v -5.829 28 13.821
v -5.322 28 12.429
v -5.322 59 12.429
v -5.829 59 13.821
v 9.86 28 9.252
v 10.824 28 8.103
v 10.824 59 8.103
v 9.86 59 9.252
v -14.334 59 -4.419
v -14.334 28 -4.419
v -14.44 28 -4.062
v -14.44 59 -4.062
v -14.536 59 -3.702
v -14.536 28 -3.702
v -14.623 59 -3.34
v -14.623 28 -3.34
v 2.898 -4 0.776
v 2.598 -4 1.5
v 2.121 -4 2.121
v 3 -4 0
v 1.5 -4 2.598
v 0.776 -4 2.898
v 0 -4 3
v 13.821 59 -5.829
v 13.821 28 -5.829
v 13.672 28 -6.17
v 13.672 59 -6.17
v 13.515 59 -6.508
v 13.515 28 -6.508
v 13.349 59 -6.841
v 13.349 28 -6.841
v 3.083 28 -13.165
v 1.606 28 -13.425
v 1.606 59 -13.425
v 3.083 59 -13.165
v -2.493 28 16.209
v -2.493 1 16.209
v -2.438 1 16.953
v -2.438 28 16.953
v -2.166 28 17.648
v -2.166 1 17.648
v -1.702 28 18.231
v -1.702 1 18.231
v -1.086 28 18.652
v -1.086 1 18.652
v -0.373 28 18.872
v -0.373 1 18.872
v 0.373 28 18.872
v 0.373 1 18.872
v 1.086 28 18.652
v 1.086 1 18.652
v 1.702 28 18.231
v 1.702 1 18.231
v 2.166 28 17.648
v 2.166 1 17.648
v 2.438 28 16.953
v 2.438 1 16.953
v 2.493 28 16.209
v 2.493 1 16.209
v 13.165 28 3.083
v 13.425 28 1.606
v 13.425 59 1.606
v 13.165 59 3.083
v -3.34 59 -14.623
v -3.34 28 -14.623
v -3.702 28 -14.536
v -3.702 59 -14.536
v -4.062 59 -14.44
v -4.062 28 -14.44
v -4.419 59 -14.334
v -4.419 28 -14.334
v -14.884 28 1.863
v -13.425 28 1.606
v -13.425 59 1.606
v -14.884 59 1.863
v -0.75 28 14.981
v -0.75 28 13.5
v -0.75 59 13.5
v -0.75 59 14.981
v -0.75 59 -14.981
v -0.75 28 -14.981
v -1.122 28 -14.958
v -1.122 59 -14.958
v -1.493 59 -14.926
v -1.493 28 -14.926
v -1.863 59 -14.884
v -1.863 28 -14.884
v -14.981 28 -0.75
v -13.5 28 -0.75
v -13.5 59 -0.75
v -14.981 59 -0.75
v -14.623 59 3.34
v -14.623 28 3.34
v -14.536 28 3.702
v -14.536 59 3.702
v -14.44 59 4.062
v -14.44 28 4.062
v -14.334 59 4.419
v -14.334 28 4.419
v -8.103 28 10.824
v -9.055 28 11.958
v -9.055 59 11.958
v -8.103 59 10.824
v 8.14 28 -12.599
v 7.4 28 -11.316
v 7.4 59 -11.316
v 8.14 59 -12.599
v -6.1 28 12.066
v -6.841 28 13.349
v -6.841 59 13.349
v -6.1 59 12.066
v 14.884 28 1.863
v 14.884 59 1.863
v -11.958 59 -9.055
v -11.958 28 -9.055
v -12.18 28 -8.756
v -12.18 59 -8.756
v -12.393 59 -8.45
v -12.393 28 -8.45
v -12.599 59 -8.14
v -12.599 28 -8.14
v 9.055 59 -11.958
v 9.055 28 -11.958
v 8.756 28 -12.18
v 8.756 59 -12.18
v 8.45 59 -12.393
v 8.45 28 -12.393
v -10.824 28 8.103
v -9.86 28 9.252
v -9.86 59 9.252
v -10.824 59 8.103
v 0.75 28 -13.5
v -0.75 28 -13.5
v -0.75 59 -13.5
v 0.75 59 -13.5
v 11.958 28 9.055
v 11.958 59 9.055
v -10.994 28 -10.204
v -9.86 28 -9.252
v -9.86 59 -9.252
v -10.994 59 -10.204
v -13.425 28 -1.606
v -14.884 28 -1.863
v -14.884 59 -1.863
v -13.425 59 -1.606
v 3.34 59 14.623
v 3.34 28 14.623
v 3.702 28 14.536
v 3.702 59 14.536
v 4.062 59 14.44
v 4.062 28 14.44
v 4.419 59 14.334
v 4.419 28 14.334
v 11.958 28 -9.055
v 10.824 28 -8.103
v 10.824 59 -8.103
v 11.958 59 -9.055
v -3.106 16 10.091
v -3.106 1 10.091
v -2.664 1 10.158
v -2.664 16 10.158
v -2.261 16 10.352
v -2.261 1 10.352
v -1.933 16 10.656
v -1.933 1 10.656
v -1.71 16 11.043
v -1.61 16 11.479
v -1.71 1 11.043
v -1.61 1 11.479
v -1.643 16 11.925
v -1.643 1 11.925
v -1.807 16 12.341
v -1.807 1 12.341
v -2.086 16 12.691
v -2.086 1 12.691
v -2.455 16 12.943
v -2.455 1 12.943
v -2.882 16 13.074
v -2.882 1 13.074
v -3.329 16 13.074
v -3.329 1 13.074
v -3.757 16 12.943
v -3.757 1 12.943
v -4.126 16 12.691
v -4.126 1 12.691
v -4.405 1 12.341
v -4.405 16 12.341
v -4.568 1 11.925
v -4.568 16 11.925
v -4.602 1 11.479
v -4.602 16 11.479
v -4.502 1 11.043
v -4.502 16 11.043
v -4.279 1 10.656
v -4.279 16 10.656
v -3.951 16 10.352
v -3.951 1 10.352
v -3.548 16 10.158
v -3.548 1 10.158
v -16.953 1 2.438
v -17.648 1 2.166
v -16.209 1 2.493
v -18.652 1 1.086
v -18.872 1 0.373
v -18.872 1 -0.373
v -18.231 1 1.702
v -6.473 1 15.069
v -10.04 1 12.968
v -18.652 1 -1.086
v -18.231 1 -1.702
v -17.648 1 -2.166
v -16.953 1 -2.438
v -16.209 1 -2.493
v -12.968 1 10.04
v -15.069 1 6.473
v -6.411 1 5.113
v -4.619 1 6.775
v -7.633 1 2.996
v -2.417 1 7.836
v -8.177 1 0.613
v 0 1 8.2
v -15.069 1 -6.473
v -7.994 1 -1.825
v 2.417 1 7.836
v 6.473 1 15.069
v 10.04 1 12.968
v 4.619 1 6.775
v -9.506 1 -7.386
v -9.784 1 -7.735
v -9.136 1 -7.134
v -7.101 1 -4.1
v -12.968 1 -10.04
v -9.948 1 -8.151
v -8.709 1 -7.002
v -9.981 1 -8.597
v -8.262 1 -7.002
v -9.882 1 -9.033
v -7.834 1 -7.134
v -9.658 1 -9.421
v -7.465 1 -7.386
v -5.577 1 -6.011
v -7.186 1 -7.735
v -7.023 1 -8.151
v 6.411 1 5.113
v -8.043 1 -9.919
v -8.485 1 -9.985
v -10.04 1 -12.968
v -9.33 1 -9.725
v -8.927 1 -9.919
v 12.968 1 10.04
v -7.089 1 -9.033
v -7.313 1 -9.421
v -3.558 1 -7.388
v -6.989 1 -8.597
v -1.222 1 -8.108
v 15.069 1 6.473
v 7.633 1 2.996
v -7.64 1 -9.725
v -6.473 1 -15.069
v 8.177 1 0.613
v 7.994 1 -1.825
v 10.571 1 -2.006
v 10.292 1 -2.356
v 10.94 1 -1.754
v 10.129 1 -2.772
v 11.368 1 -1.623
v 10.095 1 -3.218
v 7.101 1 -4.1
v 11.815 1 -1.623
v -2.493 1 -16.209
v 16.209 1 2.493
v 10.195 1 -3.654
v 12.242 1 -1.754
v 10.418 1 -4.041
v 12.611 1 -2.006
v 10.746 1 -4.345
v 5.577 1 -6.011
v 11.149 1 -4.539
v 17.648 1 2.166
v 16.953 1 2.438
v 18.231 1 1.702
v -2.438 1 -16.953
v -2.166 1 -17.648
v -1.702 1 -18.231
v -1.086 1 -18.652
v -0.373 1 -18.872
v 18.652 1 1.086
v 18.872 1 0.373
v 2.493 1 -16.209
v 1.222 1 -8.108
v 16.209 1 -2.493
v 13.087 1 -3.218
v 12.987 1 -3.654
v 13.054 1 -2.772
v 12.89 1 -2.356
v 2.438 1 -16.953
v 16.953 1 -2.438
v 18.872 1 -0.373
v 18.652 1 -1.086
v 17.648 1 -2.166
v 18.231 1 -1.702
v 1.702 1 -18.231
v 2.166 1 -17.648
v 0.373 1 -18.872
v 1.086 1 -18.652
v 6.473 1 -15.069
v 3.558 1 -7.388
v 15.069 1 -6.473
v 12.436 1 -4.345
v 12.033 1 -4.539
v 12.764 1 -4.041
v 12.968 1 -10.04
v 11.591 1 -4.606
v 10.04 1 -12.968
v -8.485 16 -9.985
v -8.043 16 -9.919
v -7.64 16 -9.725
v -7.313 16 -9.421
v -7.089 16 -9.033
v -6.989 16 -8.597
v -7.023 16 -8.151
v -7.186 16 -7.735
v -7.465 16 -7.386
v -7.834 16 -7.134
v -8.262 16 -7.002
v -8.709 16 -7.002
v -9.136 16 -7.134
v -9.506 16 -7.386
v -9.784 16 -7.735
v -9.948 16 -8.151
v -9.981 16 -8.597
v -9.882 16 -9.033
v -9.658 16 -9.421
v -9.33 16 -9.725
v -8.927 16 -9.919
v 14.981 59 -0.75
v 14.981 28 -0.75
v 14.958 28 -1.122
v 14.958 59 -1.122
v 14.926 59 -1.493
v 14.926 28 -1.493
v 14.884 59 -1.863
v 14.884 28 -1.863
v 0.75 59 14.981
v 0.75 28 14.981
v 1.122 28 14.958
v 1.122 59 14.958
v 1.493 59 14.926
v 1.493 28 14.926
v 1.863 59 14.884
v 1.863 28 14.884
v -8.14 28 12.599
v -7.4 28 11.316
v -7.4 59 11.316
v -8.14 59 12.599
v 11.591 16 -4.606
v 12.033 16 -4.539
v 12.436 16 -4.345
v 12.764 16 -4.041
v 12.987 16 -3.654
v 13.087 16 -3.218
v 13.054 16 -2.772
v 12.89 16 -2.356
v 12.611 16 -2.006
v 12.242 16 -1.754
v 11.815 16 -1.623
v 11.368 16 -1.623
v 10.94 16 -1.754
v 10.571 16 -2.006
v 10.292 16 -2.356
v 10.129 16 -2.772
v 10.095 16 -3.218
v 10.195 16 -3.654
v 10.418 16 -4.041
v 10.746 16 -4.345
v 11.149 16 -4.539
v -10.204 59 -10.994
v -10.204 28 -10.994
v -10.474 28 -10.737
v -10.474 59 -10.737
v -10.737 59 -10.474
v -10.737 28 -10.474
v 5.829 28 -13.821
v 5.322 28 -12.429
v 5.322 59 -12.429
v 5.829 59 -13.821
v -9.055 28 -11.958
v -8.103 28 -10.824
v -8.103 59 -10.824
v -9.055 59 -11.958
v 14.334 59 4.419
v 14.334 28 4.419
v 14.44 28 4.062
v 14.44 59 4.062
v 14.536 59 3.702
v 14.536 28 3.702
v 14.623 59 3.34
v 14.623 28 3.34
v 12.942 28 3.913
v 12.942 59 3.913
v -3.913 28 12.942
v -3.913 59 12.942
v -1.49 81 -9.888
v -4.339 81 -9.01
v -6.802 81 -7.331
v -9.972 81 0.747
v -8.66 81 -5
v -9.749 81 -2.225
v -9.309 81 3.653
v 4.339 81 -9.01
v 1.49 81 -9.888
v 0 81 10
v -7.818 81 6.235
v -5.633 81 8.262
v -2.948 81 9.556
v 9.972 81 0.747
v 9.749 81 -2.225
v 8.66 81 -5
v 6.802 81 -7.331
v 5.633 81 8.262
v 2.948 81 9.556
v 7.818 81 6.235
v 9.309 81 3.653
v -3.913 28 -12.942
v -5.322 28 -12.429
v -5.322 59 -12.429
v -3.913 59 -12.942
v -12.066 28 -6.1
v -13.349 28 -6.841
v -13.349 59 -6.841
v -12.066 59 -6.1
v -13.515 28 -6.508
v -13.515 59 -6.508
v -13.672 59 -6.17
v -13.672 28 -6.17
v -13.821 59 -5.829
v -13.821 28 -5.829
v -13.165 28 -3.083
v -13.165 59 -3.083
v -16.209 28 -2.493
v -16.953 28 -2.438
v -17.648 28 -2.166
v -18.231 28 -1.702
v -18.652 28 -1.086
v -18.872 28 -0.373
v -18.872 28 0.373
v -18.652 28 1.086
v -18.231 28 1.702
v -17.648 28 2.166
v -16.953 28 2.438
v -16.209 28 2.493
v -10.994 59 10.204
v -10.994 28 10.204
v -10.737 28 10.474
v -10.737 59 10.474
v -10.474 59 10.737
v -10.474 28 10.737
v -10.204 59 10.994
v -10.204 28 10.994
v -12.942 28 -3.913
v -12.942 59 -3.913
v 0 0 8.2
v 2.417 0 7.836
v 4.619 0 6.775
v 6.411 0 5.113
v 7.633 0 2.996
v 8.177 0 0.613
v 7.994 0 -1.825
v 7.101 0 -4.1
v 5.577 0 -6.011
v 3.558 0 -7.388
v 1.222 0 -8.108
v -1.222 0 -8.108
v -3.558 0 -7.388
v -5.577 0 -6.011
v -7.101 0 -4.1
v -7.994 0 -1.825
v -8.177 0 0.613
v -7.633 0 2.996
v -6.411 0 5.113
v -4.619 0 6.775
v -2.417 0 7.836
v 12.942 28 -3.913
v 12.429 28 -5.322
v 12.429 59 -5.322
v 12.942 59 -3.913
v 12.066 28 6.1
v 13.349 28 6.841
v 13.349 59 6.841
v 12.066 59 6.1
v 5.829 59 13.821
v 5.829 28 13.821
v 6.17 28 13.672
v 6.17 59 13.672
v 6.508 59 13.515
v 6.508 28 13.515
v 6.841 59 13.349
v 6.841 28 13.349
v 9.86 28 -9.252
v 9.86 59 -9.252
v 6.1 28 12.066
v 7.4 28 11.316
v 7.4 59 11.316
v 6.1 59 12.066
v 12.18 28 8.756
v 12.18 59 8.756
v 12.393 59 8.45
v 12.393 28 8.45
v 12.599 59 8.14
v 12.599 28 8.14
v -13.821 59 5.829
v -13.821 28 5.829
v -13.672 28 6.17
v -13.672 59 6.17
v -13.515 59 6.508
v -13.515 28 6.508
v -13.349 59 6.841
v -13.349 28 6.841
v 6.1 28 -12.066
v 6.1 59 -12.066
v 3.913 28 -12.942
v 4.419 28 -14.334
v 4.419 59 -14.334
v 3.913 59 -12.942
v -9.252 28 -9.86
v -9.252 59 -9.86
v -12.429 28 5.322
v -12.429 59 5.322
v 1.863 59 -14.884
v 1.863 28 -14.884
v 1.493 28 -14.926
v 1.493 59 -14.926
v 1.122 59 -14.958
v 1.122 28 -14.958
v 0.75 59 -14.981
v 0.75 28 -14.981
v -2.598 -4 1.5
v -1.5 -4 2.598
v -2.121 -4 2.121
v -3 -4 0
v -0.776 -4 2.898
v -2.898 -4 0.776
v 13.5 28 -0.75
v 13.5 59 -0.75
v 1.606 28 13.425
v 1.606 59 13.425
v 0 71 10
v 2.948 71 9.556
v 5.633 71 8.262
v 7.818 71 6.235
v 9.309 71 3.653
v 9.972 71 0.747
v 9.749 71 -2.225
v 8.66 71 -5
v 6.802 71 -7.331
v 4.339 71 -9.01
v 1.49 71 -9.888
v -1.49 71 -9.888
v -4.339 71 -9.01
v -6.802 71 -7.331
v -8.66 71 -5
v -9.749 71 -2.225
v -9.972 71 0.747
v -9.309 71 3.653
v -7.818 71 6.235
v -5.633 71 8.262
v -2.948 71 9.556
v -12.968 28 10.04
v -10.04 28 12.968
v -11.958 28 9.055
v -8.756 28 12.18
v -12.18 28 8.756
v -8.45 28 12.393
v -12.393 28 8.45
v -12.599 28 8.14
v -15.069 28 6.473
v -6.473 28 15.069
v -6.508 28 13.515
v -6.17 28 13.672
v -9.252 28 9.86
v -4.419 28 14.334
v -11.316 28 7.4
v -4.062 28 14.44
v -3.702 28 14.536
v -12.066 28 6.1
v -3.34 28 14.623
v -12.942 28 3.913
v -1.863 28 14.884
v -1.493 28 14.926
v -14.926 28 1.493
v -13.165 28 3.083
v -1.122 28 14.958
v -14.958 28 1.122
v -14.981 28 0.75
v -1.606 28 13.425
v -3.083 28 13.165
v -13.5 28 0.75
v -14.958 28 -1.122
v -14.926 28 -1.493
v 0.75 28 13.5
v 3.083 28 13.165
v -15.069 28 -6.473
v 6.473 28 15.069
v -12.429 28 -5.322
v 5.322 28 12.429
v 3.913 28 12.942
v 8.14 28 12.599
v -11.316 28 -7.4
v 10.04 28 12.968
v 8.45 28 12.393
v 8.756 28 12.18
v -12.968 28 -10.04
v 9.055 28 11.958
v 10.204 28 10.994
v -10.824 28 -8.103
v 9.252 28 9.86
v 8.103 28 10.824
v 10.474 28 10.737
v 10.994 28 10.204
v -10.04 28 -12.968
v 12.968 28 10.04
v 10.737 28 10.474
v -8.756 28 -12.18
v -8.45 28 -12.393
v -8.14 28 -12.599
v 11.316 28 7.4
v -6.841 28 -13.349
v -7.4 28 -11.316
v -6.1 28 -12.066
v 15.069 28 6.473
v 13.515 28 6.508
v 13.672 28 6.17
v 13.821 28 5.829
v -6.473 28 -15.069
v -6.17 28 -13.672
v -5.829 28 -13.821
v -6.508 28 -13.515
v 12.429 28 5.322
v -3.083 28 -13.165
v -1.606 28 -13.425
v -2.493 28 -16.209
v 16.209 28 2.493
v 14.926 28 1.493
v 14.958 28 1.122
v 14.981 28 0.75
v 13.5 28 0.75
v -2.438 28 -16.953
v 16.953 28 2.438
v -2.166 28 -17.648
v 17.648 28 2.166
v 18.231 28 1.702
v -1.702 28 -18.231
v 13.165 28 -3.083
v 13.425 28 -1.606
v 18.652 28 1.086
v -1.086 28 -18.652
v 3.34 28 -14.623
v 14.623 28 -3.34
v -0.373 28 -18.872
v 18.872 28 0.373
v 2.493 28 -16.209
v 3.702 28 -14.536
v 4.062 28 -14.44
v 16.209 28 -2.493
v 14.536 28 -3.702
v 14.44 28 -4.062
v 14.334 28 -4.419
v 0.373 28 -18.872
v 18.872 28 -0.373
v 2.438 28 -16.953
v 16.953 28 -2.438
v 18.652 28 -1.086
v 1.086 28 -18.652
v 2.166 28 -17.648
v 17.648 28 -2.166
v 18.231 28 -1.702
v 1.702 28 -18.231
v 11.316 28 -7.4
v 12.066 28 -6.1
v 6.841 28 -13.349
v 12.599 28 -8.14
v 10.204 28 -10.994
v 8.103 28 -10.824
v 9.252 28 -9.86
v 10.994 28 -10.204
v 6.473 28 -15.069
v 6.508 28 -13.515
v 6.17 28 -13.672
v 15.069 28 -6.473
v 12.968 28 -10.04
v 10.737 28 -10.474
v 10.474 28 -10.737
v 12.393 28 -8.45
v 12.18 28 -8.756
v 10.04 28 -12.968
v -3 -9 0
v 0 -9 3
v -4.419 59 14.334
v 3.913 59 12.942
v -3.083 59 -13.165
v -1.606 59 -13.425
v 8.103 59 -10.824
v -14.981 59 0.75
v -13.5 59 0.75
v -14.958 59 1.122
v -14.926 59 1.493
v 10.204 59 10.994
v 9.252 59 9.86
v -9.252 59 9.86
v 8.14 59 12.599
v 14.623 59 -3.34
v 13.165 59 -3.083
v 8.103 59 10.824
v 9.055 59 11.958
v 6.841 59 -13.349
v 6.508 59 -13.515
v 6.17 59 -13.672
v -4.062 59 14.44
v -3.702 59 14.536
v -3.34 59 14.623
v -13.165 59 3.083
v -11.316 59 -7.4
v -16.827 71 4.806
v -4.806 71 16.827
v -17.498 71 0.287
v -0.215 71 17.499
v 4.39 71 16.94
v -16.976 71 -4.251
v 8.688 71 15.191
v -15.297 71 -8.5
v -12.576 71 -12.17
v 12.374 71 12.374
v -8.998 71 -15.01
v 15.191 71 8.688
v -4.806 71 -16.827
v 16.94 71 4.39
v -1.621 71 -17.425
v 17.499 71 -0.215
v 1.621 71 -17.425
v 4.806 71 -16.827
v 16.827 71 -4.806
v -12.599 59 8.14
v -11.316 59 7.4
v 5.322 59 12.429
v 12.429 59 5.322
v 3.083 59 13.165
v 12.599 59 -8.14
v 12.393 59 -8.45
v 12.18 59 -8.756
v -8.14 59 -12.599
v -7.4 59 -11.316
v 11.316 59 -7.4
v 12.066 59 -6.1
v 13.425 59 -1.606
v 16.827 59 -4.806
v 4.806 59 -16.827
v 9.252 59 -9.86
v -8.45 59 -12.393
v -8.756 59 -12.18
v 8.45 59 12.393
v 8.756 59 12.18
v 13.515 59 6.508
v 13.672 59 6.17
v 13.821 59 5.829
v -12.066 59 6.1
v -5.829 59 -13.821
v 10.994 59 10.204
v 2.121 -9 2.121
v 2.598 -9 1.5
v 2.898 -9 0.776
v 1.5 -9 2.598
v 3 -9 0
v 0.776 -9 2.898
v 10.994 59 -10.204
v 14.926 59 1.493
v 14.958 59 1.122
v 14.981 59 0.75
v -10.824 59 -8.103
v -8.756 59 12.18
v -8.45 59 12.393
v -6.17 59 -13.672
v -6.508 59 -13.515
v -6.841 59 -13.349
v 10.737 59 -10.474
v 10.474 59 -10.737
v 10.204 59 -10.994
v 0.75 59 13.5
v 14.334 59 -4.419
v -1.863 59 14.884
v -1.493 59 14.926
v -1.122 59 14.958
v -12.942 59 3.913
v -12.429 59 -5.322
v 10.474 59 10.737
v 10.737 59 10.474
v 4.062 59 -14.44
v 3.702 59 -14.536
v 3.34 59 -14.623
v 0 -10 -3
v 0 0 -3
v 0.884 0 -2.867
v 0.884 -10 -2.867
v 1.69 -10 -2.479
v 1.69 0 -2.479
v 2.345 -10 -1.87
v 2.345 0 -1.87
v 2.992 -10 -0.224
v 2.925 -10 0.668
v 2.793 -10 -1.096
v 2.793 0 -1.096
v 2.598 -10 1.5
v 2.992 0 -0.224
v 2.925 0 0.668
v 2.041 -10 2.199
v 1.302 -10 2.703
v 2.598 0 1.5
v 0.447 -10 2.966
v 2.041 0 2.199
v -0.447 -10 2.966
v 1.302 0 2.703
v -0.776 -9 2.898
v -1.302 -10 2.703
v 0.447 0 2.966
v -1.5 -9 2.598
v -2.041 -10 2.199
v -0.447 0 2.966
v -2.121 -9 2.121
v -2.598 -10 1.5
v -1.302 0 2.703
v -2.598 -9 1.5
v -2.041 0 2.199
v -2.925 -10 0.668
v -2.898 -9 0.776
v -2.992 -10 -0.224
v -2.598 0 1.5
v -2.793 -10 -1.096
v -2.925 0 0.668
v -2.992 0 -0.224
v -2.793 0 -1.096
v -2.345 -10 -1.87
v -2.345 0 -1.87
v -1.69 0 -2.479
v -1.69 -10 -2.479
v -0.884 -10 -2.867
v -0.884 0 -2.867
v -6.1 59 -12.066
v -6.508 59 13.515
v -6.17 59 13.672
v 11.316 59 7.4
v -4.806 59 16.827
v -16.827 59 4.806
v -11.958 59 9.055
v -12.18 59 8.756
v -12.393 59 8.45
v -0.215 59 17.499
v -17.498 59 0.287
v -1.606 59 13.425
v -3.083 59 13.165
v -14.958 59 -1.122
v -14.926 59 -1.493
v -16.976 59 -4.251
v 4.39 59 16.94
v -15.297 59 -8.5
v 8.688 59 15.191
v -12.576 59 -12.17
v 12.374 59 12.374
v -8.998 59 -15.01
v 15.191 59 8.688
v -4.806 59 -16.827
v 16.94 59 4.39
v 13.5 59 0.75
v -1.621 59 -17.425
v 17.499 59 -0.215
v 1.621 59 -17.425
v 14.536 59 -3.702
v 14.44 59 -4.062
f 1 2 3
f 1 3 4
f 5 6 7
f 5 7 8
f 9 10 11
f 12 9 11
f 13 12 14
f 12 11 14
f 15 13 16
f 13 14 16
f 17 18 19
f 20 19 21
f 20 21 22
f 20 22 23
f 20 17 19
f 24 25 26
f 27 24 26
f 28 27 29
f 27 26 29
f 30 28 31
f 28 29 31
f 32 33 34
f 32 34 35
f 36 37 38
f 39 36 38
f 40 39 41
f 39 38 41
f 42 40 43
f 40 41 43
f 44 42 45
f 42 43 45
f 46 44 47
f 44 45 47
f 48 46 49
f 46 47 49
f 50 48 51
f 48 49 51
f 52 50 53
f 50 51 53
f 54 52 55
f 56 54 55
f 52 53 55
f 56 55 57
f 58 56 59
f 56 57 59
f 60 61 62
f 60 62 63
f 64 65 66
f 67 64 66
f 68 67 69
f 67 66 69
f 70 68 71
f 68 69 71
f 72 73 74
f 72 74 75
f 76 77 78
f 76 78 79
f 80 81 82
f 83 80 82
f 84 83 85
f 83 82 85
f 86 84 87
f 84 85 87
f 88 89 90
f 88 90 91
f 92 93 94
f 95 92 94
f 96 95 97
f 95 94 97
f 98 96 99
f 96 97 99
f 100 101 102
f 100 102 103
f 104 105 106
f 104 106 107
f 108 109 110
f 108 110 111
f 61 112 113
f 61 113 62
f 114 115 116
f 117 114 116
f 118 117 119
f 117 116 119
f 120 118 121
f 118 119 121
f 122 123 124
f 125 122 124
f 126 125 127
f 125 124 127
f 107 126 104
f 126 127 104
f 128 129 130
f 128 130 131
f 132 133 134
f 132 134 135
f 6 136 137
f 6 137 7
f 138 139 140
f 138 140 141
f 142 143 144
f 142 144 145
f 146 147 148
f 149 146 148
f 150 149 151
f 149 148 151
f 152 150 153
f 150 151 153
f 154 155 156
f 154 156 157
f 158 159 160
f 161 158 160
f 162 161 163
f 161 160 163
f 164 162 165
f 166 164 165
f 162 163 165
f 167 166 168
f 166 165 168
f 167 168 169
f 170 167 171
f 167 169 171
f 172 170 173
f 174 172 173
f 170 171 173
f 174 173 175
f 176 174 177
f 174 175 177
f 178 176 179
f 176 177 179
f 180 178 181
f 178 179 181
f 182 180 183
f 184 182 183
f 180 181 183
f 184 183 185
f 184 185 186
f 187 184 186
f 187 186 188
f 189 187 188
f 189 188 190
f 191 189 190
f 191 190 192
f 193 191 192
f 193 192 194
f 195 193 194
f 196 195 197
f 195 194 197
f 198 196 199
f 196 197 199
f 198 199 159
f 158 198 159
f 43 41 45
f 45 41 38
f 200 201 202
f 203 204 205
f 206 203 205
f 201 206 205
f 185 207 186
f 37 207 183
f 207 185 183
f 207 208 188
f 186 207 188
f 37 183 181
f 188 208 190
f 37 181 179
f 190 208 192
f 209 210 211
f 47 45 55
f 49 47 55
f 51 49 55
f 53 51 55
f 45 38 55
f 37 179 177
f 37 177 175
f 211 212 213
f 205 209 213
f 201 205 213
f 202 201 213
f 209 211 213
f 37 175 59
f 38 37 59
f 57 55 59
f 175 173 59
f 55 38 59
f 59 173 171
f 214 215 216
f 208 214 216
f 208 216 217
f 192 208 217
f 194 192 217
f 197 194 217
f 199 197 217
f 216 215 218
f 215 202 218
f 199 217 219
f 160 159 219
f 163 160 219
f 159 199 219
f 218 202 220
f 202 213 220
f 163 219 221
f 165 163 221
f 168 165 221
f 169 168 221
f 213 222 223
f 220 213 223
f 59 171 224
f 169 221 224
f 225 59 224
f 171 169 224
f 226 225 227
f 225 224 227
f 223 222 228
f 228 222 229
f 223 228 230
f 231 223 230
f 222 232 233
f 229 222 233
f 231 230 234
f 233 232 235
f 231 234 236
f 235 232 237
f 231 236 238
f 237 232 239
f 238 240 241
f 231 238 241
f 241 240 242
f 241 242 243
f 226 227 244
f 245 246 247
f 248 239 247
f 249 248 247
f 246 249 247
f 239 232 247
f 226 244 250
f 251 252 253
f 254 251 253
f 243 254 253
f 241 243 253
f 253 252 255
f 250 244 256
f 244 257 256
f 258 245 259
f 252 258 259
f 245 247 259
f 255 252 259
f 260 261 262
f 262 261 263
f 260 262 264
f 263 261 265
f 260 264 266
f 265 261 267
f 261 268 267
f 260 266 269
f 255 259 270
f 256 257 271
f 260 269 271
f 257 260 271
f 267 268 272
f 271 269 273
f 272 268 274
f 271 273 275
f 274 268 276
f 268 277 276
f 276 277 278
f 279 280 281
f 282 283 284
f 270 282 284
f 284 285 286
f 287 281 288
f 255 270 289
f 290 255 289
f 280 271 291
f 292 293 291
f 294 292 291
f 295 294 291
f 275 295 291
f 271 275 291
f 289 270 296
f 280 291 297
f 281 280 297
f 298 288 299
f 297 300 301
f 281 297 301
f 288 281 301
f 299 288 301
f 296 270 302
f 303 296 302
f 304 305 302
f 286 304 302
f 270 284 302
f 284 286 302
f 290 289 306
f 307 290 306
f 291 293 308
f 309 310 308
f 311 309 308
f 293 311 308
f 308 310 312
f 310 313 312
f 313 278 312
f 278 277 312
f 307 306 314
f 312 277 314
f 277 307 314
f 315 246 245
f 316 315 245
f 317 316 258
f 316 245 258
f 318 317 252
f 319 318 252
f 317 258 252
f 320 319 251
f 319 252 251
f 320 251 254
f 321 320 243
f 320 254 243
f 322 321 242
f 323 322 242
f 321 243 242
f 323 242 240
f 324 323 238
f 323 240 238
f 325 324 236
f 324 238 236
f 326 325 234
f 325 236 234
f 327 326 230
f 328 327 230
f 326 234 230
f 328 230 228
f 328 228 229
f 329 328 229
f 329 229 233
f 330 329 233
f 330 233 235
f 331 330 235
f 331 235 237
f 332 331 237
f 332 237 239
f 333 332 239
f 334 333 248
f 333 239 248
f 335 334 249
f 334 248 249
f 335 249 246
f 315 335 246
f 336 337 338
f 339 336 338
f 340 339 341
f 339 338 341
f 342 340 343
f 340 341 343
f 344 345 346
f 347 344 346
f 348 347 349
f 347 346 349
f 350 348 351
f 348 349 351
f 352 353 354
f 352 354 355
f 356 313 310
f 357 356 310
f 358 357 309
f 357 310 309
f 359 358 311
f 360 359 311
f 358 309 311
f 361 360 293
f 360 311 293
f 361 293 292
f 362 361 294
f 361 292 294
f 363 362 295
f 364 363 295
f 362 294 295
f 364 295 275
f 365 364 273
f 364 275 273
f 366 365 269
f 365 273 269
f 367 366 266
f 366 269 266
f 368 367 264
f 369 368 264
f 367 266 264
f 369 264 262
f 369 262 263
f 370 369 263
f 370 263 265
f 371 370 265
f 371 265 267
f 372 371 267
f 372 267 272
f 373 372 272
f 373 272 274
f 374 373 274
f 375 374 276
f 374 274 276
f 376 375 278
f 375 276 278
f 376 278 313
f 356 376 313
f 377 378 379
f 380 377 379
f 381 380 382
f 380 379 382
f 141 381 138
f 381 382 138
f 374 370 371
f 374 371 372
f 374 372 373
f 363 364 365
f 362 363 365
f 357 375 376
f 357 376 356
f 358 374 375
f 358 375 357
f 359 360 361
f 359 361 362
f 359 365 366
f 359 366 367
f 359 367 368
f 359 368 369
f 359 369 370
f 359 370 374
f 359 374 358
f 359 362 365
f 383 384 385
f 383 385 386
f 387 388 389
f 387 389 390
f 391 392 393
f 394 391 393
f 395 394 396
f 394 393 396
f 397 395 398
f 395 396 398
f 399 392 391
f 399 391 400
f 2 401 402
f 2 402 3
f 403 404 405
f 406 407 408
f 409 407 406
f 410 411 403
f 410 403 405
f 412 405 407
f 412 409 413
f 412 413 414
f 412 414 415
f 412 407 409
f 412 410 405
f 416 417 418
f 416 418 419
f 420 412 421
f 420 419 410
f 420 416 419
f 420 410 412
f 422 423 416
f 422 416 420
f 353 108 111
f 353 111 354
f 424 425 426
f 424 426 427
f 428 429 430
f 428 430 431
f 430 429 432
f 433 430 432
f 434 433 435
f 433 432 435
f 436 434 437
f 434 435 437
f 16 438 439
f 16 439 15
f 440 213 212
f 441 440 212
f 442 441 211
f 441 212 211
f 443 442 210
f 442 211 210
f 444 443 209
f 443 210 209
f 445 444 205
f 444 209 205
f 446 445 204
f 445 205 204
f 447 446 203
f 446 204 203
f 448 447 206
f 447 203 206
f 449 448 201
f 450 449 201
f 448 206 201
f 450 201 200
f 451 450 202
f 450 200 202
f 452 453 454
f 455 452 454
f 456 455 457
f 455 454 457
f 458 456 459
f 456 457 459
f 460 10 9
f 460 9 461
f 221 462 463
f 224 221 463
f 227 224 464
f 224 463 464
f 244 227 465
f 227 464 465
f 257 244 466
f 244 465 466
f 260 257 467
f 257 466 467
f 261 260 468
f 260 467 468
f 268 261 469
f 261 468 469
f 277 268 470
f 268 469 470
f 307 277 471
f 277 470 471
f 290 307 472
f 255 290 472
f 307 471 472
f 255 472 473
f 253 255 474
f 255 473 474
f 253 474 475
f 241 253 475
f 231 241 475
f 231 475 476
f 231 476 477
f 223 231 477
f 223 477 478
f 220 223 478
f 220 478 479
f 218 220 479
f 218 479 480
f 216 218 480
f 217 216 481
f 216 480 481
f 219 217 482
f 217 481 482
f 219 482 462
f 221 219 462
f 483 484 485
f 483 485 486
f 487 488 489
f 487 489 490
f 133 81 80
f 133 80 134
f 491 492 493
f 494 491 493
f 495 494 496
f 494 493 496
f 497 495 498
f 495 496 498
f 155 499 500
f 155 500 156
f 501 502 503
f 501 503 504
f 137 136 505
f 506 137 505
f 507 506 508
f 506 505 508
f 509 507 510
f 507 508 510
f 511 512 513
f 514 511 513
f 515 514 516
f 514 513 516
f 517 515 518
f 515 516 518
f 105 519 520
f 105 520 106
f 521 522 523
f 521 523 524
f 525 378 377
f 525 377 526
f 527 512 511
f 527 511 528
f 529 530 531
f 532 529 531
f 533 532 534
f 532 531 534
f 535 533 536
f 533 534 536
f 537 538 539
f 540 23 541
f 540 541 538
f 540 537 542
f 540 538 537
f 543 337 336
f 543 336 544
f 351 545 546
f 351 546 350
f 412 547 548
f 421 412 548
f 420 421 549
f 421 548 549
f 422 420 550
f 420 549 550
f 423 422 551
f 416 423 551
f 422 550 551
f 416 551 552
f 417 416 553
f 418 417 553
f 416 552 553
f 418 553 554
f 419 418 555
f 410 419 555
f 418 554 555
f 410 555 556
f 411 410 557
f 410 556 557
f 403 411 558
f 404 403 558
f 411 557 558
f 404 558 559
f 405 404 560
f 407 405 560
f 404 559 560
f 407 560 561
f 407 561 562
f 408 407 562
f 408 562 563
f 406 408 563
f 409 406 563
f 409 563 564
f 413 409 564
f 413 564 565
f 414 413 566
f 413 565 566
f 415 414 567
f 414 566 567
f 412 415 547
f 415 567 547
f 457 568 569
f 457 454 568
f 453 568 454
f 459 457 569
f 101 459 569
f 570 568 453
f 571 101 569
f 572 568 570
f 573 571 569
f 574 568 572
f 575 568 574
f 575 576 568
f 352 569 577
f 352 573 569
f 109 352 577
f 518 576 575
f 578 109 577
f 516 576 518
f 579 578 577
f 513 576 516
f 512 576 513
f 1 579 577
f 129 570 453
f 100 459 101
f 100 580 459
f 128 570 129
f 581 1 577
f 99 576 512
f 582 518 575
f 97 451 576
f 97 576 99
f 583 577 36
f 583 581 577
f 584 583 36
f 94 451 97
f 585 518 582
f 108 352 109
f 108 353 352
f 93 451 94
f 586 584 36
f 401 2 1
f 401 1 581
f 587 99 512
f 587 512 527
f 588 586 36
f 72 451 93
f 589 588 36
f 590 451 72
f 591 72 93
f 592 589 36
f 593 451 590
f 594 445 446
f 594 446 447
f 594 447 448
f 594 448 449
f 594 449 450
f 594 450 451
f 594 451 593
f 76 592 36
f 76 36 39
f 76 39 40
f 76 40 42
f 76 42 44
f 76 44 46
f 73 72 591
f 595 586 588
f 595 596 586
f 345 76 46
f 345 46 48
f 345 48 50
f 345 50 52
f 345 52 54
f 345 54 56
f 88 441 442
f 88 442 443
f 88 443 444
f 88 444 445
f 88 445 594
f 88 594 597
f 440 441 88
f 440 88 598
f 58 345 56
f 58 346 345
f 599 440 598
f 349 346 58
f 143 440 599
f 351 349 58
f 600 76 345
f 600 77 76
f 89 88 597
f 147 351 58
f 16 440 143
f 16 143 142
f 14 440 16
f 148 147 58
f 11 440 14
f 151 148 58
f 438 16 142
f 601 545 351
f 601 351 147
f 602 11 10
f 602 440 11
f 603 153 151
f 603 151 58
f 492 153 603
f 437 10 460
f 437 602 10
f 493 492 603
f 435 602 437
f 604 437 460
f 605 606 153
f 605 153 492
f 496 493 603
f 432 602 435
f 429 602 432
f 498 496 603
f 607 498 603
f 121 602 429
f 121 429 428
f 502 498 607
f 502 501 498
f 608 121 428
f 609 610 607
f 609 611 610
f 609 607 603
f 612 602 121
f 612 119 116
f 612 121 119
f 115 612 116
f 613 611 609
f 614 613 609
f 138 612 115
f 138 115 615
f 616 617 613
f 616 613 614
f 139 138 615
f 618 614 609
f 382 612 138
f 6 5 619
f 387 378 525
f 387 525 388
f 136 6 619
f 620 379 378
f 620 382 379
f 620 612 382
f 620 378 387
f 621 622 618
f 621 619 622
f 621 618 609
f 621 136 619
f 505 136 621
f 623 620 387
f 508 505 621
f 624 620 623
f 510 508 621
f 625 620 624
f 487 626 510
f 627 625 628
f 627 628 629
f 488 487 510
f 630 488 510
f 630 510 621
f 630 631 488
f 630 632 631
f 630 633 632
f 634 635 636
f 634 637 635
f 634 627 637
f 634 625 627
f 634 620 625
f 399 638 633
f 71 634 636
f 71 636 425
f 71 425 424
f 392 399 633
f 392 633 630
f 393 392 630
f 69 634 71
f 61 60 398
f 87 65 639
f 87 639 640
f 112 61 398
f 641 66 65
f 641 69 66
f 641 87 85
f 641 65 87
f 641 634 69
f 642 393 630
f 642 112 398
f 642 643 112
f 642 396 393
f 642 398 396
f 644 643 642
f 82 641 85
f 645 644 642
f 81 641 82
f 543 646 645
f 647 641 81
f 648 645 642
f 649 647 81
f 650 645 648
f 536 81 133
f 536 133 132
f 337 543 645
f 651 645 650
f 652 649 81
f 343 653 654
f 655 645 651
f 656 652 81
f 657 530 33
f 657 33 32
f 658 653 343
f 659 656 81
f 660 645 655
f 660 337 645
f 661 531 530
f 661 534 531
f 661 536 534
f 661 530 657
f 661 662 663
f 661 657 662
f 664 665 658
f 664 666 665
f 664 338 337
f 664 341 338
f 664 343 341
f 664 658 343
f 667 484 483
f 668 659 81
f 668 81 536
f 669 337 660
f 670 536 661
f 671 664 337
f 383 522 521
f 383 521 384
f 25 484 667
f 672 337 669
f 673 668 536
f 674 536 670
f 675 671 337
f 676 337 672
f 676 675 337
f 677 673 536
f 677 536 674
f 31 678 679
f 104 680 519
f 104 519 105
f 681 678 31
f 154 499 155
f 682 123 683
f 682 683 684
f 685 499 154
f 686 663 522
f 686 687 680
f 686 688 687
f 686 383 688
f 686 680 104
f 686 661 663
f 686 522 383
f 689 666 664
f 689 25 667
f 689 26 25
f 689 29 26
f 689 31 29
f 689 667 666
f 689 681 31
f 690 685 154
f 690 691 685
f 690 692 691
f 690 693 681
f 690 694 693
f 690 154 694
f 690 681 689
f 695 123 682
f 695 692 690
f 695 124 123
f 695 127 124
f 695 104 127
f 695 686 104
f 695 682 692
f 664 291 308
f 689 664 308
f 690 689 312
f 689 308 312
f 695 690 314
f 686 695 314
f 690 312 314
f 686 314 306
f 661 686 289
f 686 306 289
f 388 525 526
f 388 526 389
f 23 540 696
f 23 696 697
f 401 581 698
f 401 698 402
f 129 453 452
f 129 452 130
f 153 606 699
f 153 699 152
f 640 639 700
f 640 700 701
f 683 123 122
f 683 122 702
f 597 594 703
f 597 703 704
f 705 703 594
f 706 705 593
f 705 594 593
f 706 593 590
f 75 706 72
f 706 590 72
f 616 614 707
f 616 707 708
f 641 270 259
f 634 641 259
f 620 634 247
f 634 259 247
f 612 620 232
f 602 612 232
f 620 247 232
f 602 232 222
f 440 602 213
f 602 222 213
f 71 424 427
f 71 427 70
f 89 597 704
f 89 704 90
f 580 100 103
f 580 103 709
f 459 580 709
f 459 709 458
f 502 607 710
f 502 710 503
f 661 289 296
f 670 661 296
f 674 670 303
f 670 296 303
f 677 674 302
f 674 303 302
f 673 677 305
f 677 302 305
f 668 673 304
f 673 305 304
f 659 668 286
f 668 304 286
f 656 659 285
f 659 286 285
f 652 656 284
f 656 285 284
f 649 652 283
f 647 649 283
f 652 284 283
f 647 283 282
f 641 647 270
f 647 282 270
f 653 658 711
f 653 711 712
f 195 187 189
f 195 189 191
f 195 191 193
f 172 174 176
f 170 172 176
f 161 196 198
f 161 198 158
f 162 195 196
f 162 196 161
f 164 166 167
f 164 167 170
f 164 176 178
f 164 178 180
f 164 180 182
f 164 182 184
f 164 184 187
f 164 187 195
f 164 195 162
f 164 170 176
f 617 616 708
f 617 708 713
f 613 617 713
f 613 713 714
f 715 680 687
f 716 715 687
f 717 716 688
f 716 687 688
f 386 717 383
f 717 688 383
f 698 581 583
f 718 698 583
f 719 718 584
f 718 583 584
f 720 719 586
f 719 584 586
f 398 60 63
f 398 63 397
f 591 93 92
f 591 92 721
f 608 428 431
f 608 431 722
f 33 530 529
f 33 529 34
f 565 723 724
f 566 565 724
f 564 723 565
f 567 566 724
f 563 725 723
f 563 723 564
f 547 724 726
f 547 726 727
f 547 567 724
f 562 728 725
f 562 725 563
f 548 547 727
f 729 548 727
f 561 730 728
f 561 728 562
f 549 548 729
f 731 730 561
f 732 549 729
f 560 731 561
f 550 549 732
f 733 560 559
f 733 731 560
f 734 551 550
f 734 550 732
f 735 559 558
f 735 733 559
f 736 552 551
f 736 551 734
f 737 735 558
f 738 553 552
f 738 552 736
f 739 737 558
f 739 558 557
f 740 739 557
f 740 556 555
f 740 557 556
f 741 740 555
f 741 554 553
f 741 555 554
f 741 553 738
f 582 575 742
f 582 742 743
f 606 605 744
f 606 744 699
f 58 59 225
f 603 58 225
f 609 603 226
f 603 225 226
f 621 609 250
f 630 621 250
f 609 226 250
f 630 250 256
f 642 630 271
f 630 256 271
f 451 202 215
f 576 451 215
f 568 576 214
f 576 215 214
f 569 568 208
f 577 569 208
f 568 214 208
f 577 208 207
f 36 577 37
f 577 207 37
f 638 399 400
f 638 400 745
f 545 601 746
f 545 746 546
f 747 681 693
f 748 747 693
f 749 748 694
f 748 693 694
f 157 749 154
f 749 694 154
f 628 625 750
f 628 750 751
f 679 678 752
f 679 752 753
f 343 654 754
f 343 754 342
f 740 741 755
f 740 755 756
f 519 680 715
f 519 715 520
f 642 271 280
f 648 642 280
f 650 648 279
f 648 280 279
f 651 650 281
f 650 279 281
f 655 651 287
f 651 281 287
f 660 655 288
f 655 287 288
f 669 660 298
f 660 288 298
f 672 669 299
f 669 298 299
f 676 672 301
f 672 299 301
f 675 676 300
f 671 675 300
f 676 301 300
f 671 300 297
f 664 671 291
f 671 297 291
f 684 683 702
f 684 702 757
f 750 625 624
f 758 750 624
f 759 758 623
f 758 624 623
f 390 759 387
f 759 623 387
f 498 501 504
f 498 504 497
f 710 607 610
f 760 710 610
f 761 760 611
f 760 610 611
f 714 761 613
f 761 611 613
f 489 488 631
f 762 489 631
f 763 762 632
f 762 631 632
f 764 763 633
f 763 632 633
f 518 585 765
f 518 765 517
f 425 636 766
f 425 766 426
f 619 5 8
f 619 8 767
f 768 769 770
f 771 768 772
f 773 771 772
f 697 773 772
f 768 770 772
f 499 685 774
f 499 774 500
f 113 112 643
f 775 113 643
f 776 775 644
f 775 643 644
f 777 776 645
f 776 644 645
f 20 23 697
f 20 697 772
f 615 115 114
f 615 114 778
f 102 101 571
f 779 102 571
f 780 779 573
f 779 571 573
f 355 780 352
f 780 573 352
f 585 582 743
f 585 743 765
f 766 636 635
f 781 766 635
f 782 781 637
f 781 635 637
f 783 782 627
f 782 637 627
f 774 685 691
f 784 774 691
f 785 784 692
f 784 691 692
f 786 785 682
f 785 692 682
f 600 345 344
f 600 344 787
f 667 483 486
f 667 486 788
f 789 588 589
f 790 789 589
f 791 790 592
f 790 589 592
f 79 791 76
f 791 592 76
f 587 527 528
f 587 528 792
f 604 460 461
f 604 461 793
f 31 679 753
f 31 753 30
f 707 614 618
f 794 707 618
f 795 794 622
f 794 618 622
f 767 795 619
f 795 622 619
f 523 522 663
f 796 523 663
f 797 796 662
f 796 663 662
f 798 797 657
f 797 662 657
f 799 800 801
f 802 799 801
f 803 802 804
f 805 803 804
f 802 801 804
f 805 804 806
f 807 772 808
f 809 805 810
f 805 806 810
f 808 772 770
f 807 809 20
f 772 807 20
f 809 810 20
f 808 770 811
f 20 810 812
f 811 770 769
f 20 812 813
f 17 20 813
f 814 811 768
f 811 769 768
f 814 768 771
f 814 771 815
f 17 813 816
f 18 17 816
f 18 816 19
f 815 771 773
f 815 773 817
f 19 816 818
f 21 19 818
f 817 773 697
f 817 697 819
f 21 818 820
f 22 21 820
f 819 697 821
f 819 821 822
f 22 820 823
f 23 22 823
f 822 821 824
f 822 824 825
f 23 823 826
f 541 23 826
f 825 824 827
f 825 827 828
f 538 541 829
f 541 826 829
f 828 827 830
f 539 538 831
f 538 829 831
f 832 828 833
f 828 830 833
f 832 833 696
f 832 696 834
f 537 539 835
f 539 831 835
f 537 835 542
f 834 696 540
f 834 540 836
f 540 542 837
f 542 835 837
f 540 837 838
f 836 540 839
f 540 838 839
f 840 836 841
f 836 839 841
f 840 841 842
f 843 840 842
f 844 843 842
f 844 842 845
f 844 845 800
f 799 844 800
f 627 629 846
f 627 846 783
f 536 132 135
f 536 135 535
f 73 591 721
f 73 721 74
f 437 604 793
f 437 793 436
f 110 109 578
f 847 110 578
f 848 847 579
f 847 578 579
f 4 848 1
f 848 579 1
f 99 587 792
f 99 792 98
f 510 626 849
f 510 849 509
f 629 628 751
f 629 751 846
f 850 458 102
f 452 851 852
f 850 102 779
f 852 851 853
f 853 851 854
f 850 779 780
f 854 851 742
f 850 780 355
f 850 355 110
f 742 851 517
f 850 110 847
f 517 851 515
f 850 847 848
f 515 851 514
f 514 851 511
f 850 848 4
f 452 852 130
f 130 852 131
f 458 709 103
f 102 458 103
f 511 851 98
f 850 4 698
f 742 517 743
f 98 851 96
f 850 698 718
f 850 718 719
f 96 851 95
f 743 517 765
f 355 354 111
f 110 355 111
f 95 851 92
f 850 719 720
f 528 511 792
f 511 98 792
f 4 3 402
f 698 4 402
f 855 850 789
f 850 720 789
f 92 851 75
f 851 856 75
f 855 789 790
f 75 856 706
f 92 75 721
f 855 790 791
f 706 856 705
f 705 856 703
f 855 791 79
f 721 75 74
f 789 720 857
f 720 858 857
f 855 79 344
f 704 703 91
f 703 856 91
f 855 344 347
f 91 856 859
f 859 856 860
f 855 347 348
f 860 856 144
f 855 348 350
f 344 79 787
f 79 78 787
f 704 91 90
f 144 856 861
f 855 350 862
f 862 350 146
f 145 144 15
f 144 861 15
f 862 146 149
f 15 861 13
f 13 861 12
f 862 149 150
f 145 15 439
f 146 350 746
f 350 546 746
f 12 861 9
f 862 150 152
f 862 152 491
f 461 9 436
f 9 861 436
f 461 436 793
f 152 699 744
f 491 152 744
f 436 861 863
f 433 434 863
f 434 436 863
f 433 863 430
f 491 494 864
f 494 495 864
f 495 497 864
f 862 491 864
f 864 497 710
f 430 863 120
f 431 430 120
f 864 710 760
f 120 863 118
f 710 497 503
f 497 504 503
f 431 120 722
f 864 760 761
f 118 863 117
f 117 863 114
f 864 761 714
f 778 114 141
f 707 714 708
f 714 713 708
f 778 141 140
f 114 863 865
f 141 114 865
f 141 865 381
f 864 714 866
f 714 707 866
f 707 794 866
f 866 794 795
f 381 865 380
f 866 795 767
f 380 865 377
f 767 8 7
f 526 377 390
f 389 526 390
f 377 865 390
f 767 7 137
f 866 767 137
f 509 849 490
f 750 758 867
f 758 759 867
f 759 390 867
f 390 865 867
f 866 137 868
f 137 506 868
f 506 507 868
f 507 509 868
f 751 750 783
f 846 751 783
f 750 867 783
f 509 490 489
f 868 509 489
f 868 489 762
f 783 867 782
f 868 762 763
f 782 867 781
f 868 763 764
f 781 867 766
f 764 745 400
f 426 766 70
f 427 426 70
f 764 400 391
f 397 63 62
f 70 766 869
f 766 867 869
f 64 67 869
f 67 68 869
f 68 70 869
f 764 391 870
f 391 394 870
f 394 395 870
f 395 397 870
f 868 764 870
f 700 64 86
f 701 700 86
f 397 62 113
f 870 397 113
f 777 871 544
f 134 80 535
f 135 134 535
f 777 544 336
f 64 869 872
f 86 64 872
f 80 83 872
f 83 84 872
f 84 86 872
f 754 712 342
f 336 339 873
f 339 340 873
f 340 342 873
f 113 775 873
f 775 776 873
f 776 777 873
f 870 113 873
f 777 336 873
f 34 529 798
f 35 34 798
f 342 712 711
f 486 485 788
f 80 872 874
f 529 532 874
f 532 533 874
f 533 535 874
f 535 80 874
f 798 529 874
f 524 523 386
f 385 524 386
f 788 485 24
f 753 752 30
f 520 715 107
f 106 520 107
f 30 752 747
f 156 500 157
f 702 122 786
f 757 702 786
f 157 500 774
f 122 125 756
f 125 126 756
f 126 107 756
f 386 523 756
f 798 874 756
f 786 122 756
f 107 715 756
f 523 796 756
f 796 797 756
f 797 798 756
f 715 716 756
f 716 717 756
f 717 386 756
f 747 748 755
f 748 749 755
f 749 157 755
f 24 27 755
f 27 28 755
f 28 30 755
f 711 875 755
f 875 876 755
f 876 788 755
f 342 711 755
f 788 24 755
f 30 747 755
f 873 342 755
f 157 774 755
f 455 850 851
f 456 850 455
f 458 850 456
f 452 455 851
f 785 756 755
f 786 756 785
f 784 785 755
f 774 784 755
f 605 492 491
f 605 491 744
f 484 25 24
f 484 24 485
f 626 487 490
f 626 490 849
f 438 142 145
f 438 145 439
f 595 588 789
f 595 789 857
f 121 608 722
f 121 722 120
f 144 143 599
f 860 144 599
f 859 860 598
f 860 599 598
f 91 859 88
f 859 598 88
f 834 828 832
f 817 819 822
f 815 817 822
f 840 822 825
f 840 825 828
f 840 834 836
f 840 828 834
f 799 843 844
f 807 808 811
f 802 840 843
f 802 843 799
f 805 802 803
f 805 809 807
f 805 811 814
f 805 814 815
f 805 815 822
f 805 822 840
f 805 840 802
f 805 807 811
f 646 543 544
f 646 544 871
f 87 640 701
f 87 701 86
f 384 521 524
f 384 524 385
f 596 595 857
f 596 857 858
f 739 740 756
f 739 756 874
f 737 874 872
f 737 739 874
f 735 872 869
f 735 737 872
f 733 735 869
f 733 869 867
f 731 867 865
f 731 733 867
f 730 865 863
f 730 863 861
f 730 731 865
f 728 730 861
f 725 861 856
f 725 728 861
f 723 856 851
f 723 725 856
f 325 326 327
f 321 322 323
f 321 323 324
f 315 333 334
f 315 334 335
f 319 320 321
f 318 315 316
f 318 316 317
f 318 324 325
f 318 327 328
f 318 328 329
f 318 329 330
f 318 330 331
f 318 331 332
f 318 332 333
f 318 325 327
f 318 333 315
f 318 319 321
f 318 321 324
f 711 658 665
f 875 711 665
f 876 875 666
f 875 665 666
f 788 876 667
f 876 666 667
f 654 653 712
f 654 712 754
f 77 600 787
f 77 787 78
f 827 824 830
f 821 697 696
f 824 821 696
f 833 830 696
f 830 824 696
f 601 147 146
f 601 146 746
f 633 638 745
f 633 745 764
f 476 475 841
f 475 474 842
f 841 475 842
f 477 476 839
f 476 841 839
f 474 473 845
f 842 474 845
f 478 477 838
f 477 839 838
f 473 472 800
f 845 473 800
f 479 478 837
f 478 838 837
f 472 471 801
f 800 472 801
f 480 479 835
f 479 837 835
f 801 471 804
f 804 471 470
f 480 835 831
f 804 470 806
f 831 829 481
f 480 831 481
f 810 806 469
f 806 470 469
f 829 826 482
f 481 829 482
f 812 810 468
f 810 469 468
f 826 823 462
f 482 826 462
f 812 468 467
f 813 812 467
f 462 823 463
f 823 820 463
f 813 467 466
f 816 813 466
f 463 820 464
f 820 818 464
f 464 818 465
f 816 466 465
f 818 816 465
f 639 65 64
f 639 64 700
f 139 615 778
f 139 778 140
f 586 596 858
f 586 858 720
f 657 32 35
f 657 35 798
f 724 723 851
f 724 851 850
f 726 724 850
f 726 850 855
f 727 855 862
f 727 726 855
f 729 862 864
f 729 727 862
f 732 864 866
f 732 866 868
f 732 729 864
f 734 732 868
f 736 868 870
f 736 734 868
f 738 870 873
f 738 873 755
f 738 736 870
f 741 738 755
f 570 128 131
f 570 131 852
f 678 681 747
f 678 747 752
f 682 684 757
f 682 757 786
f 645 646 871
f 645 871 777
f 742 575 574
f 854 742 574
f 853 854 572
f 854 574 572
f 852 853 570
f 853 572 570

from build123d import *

# Parameters (mm, degrees)
SKETCH_1_R               = 8.2
EXTRUDE_1_DEPTH          = 1
EXTRUDE_2_DEPTH          = 27
SKETCH_3_R               = 15
EXTRUDE_4_DEPTH          = 43
SKETCH_4_R               = 10
EXTRUDE_5_DEPTH          = 10
EXTRUDE_6_DEPTH          = 12
CUT_EXTRUDE_1_DEPTH      = 31
PATTERN_CIRCULAR_1_COUNT = 36
SKETCH_7_R               = 3
EXTRUDE_7_DEPTH          = 10
CUT_EXTRUDE_START        = -5
CUT_EXTRUDE_2_DEPTH      = 5
SKETCH_10_R              = 1.5
CUT_EXTRUDE_3_DEPTH      = 15


with BuildPart() as part:
    # 草图1 → 凸台-拉伸1 (new body)
    with BuildSketch(Plane(origin=(0, 0, 0), x_dir=(1, 0, 0), z_dir=(0, 1, 0))):
        with Locations(Location((0, 0, 0), (0, 0, 270))):
            Circle(SKETCH_1_R)
    extrude(amount=EXTRUDE_1_DEPTH)

    # 草图2 → 凸台-拉伸2 (add)
    with BuildSketch(Plane(origin=(0, 1, 0), x_dir=(1, 0, 0), z_dir=(0, 1, 0))):
        with BuildLine():
            ThreePointArc((16.20945122, -2.492727655), (18.9, 0), (16.20945122, 2.492727655))
            ThreePointArc((16.20945122, 2.492727655), (11.596551211, 11.596551211), (2.492727655, 16.20945122))
            ThreePointArc((2.492727655, 16.20945122), (0, 18.9), (-2.492727655, 16.20945122))
            ThreePointArc((-2.492727655, 16.20945122), (-11.596551211, 11.596551211), (-16.20945122, 2.492727655))
            ThreePointArc((-16.20945122, 2.492727655), (-18.9, 0), (-16.20945122, -2.492727655))
            ThreePointArc((-16.20945122, -2.492727655), (-11.596551211, -11.596551211), (-2.492727655, -16.20945122))
            ThreePointArc((-2.492727655, -16.20945122), (0, -18.9), (2.492727655, -16.20945122))
            ThreePointArc((2.492727655, -16.20945122), (11.596551211, -11.596551211), (16.20945122, -2.492727655))
        make_face()
    extrude(amount=EXTRUDE_2_DEPTH)

    # 草图3 → 凸台-拉伸4 (add)
    with BuildSketch(Plane(origin=(0, 28, 0), x_dir=(1, 0, 0), z_dir=(0, 1, 0))):
        with Locations(Location((0, 0, 0), (0, 0, 270))):
            Circle(SKETCH_3_R)
    extrude(amount=EXTRUDE_4_DEPTH)

    # 草图4 → 凸台-拉伸5 (add)
    with BuildSketch(Plane(origin=(0, 71, 0), x_dir=(1, 0, 0), z_dir=(0, 1, 0))):
        with Locations(Location((0, 0, 0), (0, 0, 270))):
            Circle(SKETCH_4_R)
    extrude(amount=EXTRUDE_5_DEPTH)

    # 草图5 → 凸台-拉伸6 (add)
    with BuildSketch(Plane(origin=(0, 71, 0), x_dir=(1, 0, 0), z_dir=(0, 1, 0))):
        with BuildLine():
            Line((-16.827061466, -4.806246186), (-4.806246186, -16.827061466))
            ThreePointArc((-4.806246186, -16.827061466), (12.374368671, -12.374368671), (16.827061466, 4.806246186))
            Line((16.827061466, 4.806246186), (4.806246186, 16.827061466))
            ThreePointArc((4.806246186, 16.827061466), (0, 17.5), (-4.806246186, 16.827061466))
            ThreePointArc((-4.806246186, 16.827061466), (-15.297058541, 8.5), (-16.827061466, -4.806246186))
        make_face()
    extrude(amount=-EXTRUDE_6_DEPTH)

    # 草图6 → 切除-拉伸1 (cut)
    with BuildSketch(Plane(origin=(0, 28, 0), x_dir=(1, 0, 0), z_dir=(0, 1, 0))):
        with BuildLine():
            ThreePointArc((-14.981238267, 0.75), (-15, 0), (-14.981238267, -0.75))
            Line((-14.981238267, -0.75), (-13.5, -0.75))
            Line((-13.5, -0.75), (-13.5, 0.75))
            Line((-13.5, 0.75), (-14.981238267, 0.75))
        make_face()
    cut_extrude_1 = extrude(amount=CUT_EXTRUDE_1_DEPTH, mode=Mode.SUBTRACT)

    # 阵列(圆周)1: 切除-拉伸1 ×36 about axis
    pattern_circular_1_axis = Axis((0, 0, 0), (0, 1, 0))
    for i in range(1, PATTERN_CIRCULAR_1_COUNT):
        add(cut_extrude_1.rotate(pattern_circular_1_axis, i * 360 / PATTERN_CIRCULAR_1_COUNT), mode=Mode.SUBTRACT)

    # 草图7 → 凸台-拉伸7 (add)
    with BuildSketch(Plane.XZ):
        with Locations(Location((0, 0, 0), (0, 0, 270))):
            Circle(SKETCH_7_R)
    extrude(amount=EXTRUDE_7_DEPTH)

    # 草图9 → 切除-拉伸2 (cut)
    with BuildSketch(Plane(origin=(0, -9, 0), x_dir=(-1, 0, 0), z_dir=(0, -1, 0)).offset(CUT_EXTRUDE_START)):
        with BuildLine():
            ThreePointArc((-3, 0), (-2.121320344, -2.121320344), (0, -3))
            Line((0, -3), (-3, 0))
        make_face()
        with BuildLine():
            ThreePointArc((0, -3), (2.121320344, -2.121320344), (3, 0))
            Line((3, 0), (0, -3))
        make_face()
    extrude(amount=CUT_EXTRUDE_2_DEPTH, mode=Mode.SUBTRACT)

    # 草图10 → 切除-拉伸3 (cut)
    with BuildSketch(Plane.XZ.offset(-1)):
        with Locations(Location((-8.485281374, -8.485281374, 0), (0, 0, 270))):
            Circle(SKETCH_10_R)
        with Locations(Location((-3.105828541, 11.591109915, 0), (0, 0, 270))):
            Circle(SKETCH_10_R)
        with Locations(Location((11.591109915, -3.105828541, 0), (0, 0, 270))):
            Circle(SKETCH_10_R)
    extrude(amount=-CUT_EXTRUDE_3_DEPTH, mode=Mode.SUBTRACT)


solid = part.part
